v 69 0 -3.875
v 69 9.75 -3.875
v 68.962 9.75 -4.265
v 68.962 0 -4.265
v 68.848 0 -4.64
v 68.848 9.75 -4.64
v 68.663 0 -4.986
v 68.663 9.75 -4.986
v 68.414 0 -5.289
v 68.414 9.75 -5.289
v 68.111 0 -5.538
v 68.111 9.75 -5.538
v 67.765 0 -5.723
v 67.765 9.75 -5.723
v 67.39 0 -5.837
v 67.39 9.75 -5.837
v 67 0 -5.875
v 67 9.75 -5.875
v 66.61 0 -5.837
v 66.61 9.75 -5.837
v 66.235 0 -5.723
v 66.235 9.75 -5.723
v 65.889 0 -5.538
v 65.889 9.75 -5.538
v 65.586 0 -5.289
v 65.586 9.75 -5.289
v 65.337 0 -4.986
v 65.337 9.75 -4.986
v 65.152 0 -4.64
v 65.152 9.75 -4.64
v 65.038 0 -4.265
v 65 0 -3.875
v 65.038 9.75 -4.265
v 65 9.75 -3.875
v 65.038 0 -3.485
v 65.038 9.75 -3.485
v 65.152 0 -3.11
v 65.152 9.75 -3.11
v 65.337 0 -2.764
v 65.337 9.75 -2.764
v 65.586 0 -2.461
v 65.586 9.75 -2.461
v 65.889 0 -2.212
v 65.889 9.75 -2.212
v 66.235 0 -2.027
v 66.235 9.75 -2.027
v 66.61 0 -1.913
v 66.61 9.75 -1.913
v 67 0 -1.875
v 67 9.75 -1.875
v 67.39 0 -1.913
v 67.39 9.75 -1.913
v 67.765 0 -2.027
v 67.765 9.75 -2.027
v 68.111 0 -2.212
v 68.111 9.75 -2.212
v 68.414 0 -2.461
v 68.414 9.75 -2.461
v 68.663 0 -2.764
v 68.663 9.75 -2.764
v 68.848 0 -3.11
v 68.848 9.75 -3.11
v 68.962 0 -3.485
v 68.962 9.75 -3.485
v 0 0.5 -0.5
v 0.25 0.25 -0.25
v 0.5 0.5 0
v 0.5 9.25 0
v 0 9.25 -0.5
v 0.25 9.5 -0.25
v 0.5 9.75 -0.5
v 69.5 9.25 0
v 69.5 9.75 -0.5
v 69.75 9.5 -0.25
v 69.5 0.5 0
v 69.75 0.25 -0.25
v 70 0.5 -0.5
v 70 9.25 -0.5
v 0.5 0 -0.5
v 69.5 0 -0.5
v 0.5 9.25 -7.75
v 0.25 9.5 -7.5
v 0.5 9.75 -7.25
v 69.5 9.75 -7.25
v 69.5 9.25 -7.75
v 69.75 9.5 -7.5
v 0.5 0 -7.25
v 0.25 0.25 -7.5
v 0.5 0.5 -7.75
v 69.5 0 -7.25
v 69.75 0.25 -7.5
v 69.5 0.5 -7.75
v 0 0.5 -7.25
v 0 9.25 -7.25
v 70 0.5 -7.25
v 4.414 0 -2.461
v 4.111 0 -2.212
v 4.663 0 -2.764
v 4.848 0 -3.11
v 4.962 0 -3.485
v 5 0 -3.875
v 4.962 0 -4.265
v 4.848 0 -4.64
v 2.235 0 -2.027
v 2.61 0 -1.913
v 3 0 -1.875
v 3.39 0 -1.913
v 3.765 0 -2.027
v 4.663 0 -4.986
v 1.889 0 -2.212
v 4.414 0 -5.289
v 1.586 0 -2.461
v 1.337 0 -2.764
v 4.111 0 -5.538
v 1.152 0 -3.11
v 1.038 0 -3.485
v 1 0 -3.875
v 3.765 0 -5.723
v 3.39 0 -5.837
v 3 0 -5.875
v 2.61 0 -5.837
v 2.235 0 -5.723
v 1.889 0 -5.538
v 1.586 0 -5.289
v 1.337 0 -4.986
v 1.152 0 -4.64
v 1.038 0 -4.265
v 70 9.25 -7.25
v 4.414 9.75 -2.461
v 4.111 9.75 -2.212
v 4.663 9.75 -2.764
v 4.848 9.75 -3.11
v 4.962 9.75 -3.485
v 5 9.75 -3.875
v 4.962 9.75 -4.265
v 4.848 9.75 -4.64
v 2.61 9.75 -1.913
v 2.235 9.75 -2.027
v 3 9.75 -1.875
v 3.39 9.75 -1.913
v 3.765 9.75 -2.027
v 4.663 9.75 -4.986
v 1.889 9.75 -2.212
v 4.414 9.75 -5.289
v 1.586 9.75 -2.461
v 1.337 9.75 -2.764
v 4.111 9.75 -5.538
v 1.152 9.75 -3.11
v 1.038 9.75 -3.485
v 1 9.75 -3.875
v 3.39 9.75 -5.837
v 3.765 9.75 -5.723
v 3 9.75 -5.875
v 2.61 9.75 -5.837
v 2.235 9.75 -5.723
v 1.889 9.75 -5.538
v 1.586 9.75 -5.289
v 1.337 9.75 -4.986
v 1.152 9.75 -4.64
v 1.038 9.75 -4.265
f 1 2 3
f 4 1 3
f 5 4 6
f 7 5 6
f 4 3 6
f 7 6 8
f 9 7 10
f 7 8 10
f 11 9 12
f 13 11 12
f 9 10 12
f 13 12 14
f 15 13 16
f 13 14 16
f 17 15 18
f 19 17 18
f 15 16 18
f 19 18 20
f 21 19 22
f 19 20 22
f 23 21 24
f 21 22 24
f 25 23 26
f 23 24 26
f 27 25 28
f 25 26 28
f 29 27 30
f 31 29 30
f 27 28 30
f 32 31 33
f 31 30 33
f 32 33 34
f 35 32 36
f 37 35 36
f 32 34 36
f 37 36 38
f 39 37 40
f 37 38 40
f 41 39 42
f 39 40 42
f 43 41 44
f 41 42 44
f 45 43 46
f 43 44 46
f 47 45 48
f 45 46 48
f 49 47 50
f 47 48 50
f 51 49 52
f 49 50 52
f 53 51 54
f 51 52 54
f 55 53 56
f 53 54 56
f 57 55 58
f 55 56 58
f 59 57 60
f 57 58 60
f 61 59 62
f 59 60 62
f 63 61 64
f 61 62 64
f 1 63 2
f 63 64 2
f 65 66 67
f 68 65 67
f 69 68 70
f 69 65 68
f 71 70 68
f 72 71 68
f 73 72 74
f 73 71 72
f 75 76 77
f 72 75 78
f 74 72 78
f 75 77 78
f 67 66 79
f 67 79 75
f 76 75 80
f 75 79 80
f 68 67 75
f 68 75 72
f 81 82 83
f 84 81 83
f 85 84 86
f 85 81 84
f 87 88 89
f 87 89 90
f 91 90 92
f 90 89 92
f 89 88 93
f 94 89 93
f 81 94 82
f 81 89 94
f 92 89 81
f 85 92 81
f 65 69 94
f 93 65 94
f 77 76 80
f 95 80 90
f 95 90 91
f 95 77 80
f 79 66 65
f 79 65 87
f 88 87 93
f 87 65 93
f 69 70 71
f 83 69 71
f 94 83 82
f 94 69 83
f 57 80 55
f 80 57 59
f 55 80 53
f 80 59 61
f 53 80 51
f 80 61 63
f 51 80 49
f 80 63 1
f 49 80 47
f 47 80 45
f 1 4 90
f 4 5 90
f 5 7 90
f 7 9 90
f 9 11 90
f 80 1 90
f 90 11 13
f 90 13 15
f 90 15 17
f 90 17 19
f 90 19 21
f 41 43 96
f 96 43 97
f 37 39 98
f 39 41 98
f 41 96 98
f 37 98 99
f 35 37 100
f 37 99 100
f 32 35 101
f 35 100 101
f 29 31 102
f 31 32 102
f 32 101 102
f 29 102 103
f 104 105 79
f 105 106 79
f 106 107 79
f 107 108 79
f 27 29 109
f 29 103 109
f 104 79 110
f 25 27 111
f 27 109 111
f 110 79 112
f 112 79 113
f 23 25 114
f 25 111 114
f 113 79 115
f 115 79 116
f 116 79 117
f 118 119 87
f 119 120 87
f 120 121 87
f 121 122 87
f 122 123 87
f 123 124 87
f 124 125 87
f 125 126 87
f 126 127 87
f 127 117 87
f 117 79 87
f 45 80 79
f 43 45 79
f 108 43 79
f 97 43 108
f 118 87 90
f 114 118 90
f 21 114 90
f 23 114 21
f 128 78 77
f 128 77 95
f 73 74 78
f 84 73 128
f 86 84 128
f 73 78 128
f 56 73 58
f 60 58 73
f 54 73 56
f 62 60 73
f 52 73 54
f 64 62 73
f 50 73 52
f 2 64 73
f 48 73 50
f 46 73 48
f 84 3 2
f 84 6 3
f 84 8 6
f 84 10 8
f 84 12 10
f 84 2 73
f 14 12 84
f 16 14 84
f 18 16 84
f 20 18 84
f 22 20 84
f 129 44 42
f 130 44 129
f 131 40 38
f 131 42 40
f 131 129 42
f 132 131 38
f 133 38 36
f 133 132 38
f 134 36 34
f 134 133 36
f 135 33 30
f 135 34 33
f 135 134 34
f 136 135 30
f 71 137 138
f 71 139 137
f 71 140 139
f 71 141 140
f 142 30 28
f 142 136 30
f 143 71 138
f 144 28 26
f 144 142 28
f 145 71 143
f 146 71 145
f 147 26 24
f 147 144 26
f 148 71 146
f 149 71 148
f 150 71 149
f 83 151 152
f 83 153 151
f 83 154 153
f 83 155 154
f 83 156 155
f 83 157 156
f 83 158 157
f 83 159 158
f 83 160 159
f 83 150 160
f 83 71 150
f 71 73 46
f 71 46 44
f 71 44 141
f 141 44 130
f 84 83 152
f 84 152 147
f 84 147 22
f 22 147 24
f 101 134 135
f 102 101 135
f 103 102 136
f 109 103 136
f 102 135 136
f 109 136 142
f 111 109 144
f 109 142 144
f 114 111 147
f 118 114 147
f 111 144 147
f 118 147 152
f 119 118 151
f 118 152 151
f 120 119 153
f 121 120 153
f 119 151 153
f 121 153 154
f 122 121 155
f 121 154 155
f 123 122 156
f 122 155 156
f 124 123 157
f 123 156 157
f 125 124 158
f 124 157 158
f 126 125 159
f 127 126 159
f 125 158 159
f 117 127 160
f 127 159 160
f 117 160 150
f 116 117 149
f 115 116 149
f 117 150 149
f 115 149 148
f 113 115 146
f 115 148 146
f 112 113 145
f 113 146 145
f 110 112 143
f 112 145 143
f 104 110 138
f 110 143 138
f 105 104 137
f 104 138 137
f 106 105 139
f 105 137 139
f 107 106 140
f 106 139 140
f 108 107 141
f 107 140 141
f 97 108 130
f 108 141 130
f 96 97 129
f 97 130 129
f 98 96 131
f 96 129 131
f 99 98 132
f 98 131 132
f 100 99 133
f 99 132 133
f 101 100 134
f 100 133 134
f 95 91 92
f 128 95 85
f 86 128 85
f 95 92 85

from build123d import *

# Parameters (mm, degrees)
SKETCH1_W           = 7.75
SKETCH1_H           = 9.75
BOSS_EXTRUDE1_DEPTH = 70
SKETCH4_R           = 2
CUT_EXTRUDE3_DEPTH  = 9.75
CHAMFER1_SIZE       = 0.5
CHAMFER2_SIZE       = 0.5


with BuildPart() as part:
    # Sketch1 → Boss-Extrude1 (new body)
    with BuildSketch(Plane(origin=(0, 0, 0), x_dir=(0, 0, -1), z_dir=(1, 0, 0))):
        with Locations((3.875, 4.875)):
            Rectangle(SKETCH1_W, SKETCH1_H)
    extrude(amount=BOSS_EXTRUDE1_DEPTH)

    # Sketch4 → Cut-Extrude3 (cut)
    with BuildSketch(Plane(origin=(0, 9.75, 0), x_dir=(1, 0, 0), z_dir=(0, 1, 0))):
        with Locations((3, 3.875)):
            Circle(SKETCH4_R)
        with Locations((67, 3.875)):
            Circle(SKETCH4_R)
    extrude(amount=-CUT_EXTRUDE3_DEPTH, mode=Mode.SUBTRACT)

    # Chamfer1
    chamfer1_edges = [part.edges().sort_by_distance(p)[0] for p in [
        (70, 4.875, -7.75),
        (70, 9.75, -3.875),
        (70, 4.875, 0),
        (0, 9.75, -3.875),
        (0, 4.875, -7.75),
        (0, 0, -3.875),
        (0, 4.875, 0),
        (70, 0, -3.875),
    ]]
    chamfer(chamfer1_edges, length=CHAMFER1_SIZE)

    # Chamfer2
    chamfer2_edges = [part.edges().sort_by_distance(p)[0] for p in [
        (35, 0, -7.75),
        (35, 0, 0),
        (35, 9.75, -7.75),
        (35, 9.75, 0),
    ]]
    chamfer(chamfer2_edges, length=CHAMFER2_SIZE)


solid = part.part
